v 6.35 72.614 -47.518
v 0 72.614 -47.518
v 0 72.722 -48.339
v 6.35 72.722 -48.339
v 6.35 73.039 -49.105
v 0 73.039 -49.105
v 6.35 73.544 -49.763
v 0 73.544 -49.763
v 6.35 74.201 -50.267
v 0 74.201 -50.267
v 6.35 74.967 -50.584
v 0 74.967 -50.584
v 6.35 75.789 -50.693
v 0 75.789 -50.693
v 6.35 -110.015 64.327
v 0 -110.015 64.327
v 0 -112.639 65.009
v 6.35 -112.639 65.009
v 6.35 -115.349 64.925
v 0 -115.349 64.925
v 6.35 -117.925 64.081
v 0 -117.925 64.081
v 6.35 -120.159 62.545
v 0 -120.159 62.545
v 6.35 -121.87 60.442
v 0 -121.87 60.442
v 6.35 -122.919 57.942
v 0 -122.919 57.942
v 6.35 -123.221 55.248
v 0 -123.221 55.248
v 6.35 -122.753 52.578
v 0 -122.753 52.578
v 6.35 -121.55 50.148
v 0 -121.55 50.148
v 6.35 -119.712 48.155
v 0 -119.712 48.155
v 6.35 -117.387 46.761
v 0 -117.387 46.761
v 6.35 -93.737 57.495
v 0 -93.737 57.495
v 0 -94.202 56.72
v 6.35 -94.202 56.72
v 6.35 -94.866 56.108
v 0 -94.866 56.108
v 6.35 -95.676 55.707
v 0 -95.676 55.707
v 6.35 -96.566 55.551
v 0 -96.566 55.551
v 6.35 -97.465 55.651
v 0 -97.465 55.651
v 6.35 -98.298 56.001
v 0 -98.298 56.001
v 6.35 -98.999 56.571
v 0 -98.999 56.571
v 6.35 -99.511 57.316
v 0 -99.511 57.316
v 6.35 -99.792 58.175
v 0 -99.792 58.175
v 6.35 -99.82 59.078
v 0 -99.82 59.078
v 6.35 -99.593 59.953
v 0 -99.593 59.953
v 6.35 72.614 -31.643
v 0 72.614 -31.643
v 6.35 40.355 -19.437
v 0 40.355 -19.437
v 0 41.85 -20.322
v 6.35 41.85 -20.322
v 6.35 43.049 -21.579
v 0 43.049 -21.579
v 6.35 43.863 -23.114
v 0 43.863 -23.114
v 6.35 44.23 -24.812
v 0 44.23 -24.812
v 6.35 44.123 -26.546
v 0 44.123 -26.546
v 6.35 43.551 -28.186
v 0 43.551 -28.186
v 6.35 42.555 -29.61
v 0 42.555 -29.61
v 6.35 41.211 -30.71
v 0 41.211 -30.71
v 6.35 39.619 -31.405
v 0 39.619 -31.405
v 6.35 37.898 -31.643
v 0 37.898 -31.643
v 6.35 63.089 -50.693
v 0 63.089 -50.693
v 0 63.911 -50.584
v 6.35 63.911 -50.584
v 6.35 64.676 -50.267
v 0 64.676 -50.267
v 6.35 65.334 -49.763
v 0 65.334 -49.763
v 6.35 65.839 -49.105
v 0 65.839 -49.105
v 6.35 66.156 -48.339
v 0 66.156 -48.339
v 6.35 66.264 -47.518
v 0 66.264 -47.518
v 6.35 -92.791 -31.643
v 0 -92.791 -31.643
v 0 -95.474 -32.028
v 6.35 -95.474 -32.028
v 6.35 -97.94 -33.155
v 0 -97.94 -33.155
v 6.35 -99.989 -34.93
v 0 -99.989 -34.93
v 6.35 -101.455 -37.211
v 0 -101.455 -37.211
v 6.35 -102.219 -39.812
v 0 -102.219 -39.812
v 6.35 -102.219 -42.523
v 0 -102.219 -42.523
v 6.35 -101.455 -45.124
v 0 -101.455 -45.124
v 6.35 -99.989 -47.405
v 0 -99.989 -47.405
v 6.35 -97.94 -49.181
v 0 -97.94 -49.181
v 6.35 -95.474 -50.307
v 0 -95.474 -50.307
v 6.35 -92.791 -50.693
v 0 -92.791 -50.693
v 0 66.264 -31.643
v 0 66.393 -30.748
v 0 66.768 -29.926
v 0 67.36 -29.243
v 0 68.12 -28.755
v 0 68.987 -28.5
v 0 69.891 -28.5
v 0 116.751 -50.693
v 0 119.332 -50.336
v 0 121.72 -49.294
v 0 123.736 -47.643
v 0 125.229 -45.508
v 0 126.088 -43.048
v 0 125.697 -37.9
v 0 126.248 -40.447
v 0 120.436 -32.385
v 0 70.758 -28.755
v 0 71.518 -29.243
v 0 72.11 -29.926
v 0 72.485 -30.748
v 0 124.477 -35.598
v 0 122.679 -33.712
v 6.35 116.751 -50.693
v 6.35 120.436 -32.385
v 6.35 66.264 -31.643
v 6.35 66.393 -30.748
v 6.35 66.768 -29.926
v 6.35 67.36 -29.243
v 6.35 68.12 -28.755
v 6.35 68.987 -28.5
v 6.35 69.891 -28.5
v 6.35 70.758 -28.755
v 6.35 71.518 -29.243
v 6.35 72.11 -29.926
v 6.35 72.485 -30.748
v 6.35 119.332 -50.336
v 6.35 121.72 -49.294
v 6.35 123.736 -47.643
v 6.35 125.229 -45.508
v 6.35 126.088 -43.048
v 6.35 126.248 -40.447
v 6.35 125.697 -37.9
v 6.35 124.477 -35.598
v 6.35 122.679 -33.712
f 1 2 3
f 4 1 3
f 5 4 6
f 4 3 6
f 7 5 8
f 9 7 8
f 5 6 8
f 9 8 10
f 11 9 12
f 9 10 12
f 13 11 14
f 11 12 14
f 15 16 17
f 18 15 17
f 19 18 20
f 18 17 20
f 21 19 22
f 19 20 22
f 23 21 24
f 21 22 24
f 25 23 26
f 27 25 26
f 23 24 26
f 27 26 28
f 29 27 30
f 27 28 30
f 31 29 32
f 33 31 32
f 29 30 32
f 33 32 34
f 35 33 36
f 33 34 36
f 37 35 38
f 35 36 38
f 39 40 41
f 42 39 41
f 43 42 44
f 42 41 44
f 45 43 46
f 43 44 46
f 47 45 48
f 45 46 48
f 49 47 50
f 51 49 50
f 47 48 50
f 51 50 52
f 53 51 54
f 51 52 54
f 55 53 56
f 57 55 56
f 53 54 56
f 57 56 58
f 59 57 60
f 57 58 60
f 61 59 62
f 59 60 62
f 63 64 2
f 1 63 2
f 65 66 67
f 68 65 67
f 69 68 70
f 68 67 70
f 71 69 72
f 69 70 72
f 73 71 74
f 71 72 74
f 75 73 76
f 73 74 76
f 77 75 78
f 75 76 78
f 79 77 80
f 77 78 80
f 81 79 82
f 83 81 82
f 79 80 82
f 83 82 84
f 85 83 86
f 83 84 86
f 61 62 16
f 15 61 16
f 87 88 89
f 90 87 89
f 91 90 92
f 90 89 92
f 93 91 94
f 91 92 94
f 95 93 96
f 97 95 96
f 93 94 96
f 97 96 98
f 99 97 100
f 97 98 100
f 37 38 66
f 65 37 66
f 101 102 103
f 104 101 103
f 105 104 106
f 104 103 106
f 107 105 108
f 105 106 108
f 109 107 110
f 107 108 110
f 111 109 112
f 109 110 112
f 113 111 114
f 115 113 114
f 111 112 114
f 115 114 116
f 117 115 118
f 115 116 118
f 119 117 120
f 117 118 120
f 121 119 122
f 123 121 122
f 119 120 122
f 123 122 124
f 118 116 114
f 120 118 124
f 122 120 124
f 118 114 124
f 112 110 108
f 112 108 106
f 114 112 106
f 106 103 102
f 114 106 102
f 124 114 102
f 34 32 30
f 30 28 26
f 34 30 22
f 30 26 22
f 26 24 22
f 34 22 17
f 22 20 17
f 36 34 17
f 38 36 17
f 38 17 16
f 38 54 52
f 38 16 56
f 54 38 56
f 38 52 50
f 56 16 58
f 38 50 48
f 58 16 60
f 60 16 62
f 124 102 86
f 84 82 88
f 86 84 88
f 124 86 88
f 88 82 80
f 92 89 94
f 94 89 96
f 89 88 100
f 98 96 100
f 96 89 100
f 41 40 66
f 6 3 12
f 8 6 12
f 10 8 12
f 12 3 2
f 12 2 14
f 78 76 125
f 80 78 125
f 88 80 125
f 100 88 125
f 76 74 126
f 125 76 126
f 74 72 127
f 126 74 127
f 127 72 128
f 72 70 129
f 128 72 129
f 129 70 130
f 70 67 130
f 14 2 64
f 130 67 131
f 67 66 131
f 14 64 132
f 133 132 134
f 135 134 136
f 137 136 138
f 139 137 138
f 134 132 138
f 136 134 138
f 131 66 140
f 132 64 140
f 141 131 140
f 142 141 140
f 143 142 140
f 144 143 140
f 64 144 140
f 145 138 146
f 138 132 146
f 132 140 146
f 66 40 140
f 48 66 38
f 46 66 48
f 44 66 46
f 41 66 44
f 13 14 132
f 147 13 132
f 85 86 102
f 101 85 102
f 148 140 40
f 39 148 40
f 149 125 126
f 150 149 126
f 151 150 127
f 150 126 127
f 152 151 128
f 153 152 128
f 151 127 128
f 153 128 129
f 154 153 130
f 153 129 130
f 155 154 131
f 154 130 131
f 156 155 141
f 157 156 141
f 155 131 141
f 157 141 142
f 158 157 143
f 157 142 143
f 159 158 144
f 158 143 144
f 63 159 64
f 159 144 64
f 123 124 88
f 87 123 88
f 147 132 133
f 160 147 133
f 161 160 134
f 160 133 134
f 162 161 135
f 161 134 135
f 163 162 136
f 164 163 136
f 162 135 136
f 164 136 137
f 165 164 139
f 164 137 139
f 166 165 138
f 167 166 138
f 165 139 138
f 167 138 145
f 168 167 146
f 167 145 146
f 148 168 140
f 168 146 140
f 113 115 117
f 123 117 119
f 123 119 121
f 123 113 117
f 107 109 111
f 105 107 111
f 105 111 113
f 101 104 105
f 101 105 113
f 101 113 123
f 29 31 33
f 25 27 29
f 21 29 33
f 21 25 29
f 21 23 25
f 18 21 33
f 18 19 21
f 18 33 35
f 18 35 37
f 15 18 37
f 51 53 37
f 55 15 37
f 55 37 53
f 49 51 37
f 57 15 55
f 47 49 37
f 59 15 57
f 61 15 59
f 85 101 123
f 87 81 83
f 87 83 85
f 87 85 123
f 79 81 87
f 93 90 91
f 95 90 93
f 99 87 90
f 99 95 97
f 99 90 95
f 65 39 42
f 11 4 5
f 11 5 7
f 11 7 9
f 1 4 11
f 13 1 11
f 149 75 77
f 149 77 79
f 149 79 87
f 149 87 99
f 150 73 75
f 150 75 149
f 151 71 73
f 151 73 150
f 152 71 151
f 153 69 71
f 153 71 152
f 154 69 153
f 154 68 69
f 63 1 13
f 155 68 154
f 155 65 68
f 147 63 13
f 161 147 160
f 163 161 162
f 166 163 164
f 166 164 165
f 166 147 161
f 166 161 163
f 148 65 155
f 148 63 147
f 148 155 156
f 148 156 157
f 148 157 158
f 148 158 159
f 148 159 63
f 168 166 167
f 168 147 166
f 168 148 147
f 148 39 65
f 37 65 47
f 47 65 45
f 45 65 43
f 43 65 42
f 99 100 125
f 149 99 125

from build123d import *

# Parameters (mm, degrees)
F0_R     = 1.27
F1_DEPTH = 6.35


with BuildPart() as f1:
    # F0 (on Right) → F1 (new body)
    with BuildSketch(Plane.YZ):
        with BuildLine():
            ThreePointArc((116.750538, -50.692635), (126.088182, -43.047537), (120.436387, -32.384689))
            Line((120.436387, -32.384689), (-93.737434, 57.495441))
            ThreePointArc((-93.737434, 57.495441), (-97.893699, 55.796408), (-99.592732, 59.952673))
            Line((-99.592732, 59.952673), (-110.015241, 64.326581))
            ThreePointArc((-110.015241, 64.326581), (-122.484036, 59.229484), (-117.386939, 46.760689))
            Line((-117.386939, 46.760689), (40.355204, -19.437338))
            ThreePointArc((40.355204, -19.437338), (44.123068, -26.545903), (37.897972, -31.642635))
            Line((37.897972, -31.642635), (-92.790544, -31.642635))
            ThreePointArc((-92.790544, -31.642635), (-102.315544, -41.167635), (-92.790544, -50.692635))
            Line((-92.790544, -50.692635), (63.088998, -50.692635))
            ThreePointArc((63.088998, -50.692635), (65.334062, -49.7627), (66.263998, -47.517635))
            Line((66.263998, -47.517635), (66.263998, -31.642635))
            ThreePointArc((66.263998, -31.642635), (69.438998, -28.467635), (72.613998, -31.642635))
            Line((72.613998, -31.642635), (72.613998, -47.517635))
            ThreePointArc((72.613998, -47.517635), (73.543934, -49.7627), (75.788998, -50.692635))
            Line((75.788998, -50.692635), (116.750538, -50.692635))
        make_face()
        with Locations((108.209478, -36.894451)):
            Circle(F0_R, mode=Mode.SUBTRACT)
        with Locations((97.462779, -32.384689)):
            Circle(F0_R, mode=Mode.SUBTRACT)
        with Locations((108.209478, -36.894451)):
            Circle(F0_R)
        with Locations((97.462779, -32.384689)):
            Circle(F0_R)
    extrude(amount=F1_DEPTH)


solid = f1.part
